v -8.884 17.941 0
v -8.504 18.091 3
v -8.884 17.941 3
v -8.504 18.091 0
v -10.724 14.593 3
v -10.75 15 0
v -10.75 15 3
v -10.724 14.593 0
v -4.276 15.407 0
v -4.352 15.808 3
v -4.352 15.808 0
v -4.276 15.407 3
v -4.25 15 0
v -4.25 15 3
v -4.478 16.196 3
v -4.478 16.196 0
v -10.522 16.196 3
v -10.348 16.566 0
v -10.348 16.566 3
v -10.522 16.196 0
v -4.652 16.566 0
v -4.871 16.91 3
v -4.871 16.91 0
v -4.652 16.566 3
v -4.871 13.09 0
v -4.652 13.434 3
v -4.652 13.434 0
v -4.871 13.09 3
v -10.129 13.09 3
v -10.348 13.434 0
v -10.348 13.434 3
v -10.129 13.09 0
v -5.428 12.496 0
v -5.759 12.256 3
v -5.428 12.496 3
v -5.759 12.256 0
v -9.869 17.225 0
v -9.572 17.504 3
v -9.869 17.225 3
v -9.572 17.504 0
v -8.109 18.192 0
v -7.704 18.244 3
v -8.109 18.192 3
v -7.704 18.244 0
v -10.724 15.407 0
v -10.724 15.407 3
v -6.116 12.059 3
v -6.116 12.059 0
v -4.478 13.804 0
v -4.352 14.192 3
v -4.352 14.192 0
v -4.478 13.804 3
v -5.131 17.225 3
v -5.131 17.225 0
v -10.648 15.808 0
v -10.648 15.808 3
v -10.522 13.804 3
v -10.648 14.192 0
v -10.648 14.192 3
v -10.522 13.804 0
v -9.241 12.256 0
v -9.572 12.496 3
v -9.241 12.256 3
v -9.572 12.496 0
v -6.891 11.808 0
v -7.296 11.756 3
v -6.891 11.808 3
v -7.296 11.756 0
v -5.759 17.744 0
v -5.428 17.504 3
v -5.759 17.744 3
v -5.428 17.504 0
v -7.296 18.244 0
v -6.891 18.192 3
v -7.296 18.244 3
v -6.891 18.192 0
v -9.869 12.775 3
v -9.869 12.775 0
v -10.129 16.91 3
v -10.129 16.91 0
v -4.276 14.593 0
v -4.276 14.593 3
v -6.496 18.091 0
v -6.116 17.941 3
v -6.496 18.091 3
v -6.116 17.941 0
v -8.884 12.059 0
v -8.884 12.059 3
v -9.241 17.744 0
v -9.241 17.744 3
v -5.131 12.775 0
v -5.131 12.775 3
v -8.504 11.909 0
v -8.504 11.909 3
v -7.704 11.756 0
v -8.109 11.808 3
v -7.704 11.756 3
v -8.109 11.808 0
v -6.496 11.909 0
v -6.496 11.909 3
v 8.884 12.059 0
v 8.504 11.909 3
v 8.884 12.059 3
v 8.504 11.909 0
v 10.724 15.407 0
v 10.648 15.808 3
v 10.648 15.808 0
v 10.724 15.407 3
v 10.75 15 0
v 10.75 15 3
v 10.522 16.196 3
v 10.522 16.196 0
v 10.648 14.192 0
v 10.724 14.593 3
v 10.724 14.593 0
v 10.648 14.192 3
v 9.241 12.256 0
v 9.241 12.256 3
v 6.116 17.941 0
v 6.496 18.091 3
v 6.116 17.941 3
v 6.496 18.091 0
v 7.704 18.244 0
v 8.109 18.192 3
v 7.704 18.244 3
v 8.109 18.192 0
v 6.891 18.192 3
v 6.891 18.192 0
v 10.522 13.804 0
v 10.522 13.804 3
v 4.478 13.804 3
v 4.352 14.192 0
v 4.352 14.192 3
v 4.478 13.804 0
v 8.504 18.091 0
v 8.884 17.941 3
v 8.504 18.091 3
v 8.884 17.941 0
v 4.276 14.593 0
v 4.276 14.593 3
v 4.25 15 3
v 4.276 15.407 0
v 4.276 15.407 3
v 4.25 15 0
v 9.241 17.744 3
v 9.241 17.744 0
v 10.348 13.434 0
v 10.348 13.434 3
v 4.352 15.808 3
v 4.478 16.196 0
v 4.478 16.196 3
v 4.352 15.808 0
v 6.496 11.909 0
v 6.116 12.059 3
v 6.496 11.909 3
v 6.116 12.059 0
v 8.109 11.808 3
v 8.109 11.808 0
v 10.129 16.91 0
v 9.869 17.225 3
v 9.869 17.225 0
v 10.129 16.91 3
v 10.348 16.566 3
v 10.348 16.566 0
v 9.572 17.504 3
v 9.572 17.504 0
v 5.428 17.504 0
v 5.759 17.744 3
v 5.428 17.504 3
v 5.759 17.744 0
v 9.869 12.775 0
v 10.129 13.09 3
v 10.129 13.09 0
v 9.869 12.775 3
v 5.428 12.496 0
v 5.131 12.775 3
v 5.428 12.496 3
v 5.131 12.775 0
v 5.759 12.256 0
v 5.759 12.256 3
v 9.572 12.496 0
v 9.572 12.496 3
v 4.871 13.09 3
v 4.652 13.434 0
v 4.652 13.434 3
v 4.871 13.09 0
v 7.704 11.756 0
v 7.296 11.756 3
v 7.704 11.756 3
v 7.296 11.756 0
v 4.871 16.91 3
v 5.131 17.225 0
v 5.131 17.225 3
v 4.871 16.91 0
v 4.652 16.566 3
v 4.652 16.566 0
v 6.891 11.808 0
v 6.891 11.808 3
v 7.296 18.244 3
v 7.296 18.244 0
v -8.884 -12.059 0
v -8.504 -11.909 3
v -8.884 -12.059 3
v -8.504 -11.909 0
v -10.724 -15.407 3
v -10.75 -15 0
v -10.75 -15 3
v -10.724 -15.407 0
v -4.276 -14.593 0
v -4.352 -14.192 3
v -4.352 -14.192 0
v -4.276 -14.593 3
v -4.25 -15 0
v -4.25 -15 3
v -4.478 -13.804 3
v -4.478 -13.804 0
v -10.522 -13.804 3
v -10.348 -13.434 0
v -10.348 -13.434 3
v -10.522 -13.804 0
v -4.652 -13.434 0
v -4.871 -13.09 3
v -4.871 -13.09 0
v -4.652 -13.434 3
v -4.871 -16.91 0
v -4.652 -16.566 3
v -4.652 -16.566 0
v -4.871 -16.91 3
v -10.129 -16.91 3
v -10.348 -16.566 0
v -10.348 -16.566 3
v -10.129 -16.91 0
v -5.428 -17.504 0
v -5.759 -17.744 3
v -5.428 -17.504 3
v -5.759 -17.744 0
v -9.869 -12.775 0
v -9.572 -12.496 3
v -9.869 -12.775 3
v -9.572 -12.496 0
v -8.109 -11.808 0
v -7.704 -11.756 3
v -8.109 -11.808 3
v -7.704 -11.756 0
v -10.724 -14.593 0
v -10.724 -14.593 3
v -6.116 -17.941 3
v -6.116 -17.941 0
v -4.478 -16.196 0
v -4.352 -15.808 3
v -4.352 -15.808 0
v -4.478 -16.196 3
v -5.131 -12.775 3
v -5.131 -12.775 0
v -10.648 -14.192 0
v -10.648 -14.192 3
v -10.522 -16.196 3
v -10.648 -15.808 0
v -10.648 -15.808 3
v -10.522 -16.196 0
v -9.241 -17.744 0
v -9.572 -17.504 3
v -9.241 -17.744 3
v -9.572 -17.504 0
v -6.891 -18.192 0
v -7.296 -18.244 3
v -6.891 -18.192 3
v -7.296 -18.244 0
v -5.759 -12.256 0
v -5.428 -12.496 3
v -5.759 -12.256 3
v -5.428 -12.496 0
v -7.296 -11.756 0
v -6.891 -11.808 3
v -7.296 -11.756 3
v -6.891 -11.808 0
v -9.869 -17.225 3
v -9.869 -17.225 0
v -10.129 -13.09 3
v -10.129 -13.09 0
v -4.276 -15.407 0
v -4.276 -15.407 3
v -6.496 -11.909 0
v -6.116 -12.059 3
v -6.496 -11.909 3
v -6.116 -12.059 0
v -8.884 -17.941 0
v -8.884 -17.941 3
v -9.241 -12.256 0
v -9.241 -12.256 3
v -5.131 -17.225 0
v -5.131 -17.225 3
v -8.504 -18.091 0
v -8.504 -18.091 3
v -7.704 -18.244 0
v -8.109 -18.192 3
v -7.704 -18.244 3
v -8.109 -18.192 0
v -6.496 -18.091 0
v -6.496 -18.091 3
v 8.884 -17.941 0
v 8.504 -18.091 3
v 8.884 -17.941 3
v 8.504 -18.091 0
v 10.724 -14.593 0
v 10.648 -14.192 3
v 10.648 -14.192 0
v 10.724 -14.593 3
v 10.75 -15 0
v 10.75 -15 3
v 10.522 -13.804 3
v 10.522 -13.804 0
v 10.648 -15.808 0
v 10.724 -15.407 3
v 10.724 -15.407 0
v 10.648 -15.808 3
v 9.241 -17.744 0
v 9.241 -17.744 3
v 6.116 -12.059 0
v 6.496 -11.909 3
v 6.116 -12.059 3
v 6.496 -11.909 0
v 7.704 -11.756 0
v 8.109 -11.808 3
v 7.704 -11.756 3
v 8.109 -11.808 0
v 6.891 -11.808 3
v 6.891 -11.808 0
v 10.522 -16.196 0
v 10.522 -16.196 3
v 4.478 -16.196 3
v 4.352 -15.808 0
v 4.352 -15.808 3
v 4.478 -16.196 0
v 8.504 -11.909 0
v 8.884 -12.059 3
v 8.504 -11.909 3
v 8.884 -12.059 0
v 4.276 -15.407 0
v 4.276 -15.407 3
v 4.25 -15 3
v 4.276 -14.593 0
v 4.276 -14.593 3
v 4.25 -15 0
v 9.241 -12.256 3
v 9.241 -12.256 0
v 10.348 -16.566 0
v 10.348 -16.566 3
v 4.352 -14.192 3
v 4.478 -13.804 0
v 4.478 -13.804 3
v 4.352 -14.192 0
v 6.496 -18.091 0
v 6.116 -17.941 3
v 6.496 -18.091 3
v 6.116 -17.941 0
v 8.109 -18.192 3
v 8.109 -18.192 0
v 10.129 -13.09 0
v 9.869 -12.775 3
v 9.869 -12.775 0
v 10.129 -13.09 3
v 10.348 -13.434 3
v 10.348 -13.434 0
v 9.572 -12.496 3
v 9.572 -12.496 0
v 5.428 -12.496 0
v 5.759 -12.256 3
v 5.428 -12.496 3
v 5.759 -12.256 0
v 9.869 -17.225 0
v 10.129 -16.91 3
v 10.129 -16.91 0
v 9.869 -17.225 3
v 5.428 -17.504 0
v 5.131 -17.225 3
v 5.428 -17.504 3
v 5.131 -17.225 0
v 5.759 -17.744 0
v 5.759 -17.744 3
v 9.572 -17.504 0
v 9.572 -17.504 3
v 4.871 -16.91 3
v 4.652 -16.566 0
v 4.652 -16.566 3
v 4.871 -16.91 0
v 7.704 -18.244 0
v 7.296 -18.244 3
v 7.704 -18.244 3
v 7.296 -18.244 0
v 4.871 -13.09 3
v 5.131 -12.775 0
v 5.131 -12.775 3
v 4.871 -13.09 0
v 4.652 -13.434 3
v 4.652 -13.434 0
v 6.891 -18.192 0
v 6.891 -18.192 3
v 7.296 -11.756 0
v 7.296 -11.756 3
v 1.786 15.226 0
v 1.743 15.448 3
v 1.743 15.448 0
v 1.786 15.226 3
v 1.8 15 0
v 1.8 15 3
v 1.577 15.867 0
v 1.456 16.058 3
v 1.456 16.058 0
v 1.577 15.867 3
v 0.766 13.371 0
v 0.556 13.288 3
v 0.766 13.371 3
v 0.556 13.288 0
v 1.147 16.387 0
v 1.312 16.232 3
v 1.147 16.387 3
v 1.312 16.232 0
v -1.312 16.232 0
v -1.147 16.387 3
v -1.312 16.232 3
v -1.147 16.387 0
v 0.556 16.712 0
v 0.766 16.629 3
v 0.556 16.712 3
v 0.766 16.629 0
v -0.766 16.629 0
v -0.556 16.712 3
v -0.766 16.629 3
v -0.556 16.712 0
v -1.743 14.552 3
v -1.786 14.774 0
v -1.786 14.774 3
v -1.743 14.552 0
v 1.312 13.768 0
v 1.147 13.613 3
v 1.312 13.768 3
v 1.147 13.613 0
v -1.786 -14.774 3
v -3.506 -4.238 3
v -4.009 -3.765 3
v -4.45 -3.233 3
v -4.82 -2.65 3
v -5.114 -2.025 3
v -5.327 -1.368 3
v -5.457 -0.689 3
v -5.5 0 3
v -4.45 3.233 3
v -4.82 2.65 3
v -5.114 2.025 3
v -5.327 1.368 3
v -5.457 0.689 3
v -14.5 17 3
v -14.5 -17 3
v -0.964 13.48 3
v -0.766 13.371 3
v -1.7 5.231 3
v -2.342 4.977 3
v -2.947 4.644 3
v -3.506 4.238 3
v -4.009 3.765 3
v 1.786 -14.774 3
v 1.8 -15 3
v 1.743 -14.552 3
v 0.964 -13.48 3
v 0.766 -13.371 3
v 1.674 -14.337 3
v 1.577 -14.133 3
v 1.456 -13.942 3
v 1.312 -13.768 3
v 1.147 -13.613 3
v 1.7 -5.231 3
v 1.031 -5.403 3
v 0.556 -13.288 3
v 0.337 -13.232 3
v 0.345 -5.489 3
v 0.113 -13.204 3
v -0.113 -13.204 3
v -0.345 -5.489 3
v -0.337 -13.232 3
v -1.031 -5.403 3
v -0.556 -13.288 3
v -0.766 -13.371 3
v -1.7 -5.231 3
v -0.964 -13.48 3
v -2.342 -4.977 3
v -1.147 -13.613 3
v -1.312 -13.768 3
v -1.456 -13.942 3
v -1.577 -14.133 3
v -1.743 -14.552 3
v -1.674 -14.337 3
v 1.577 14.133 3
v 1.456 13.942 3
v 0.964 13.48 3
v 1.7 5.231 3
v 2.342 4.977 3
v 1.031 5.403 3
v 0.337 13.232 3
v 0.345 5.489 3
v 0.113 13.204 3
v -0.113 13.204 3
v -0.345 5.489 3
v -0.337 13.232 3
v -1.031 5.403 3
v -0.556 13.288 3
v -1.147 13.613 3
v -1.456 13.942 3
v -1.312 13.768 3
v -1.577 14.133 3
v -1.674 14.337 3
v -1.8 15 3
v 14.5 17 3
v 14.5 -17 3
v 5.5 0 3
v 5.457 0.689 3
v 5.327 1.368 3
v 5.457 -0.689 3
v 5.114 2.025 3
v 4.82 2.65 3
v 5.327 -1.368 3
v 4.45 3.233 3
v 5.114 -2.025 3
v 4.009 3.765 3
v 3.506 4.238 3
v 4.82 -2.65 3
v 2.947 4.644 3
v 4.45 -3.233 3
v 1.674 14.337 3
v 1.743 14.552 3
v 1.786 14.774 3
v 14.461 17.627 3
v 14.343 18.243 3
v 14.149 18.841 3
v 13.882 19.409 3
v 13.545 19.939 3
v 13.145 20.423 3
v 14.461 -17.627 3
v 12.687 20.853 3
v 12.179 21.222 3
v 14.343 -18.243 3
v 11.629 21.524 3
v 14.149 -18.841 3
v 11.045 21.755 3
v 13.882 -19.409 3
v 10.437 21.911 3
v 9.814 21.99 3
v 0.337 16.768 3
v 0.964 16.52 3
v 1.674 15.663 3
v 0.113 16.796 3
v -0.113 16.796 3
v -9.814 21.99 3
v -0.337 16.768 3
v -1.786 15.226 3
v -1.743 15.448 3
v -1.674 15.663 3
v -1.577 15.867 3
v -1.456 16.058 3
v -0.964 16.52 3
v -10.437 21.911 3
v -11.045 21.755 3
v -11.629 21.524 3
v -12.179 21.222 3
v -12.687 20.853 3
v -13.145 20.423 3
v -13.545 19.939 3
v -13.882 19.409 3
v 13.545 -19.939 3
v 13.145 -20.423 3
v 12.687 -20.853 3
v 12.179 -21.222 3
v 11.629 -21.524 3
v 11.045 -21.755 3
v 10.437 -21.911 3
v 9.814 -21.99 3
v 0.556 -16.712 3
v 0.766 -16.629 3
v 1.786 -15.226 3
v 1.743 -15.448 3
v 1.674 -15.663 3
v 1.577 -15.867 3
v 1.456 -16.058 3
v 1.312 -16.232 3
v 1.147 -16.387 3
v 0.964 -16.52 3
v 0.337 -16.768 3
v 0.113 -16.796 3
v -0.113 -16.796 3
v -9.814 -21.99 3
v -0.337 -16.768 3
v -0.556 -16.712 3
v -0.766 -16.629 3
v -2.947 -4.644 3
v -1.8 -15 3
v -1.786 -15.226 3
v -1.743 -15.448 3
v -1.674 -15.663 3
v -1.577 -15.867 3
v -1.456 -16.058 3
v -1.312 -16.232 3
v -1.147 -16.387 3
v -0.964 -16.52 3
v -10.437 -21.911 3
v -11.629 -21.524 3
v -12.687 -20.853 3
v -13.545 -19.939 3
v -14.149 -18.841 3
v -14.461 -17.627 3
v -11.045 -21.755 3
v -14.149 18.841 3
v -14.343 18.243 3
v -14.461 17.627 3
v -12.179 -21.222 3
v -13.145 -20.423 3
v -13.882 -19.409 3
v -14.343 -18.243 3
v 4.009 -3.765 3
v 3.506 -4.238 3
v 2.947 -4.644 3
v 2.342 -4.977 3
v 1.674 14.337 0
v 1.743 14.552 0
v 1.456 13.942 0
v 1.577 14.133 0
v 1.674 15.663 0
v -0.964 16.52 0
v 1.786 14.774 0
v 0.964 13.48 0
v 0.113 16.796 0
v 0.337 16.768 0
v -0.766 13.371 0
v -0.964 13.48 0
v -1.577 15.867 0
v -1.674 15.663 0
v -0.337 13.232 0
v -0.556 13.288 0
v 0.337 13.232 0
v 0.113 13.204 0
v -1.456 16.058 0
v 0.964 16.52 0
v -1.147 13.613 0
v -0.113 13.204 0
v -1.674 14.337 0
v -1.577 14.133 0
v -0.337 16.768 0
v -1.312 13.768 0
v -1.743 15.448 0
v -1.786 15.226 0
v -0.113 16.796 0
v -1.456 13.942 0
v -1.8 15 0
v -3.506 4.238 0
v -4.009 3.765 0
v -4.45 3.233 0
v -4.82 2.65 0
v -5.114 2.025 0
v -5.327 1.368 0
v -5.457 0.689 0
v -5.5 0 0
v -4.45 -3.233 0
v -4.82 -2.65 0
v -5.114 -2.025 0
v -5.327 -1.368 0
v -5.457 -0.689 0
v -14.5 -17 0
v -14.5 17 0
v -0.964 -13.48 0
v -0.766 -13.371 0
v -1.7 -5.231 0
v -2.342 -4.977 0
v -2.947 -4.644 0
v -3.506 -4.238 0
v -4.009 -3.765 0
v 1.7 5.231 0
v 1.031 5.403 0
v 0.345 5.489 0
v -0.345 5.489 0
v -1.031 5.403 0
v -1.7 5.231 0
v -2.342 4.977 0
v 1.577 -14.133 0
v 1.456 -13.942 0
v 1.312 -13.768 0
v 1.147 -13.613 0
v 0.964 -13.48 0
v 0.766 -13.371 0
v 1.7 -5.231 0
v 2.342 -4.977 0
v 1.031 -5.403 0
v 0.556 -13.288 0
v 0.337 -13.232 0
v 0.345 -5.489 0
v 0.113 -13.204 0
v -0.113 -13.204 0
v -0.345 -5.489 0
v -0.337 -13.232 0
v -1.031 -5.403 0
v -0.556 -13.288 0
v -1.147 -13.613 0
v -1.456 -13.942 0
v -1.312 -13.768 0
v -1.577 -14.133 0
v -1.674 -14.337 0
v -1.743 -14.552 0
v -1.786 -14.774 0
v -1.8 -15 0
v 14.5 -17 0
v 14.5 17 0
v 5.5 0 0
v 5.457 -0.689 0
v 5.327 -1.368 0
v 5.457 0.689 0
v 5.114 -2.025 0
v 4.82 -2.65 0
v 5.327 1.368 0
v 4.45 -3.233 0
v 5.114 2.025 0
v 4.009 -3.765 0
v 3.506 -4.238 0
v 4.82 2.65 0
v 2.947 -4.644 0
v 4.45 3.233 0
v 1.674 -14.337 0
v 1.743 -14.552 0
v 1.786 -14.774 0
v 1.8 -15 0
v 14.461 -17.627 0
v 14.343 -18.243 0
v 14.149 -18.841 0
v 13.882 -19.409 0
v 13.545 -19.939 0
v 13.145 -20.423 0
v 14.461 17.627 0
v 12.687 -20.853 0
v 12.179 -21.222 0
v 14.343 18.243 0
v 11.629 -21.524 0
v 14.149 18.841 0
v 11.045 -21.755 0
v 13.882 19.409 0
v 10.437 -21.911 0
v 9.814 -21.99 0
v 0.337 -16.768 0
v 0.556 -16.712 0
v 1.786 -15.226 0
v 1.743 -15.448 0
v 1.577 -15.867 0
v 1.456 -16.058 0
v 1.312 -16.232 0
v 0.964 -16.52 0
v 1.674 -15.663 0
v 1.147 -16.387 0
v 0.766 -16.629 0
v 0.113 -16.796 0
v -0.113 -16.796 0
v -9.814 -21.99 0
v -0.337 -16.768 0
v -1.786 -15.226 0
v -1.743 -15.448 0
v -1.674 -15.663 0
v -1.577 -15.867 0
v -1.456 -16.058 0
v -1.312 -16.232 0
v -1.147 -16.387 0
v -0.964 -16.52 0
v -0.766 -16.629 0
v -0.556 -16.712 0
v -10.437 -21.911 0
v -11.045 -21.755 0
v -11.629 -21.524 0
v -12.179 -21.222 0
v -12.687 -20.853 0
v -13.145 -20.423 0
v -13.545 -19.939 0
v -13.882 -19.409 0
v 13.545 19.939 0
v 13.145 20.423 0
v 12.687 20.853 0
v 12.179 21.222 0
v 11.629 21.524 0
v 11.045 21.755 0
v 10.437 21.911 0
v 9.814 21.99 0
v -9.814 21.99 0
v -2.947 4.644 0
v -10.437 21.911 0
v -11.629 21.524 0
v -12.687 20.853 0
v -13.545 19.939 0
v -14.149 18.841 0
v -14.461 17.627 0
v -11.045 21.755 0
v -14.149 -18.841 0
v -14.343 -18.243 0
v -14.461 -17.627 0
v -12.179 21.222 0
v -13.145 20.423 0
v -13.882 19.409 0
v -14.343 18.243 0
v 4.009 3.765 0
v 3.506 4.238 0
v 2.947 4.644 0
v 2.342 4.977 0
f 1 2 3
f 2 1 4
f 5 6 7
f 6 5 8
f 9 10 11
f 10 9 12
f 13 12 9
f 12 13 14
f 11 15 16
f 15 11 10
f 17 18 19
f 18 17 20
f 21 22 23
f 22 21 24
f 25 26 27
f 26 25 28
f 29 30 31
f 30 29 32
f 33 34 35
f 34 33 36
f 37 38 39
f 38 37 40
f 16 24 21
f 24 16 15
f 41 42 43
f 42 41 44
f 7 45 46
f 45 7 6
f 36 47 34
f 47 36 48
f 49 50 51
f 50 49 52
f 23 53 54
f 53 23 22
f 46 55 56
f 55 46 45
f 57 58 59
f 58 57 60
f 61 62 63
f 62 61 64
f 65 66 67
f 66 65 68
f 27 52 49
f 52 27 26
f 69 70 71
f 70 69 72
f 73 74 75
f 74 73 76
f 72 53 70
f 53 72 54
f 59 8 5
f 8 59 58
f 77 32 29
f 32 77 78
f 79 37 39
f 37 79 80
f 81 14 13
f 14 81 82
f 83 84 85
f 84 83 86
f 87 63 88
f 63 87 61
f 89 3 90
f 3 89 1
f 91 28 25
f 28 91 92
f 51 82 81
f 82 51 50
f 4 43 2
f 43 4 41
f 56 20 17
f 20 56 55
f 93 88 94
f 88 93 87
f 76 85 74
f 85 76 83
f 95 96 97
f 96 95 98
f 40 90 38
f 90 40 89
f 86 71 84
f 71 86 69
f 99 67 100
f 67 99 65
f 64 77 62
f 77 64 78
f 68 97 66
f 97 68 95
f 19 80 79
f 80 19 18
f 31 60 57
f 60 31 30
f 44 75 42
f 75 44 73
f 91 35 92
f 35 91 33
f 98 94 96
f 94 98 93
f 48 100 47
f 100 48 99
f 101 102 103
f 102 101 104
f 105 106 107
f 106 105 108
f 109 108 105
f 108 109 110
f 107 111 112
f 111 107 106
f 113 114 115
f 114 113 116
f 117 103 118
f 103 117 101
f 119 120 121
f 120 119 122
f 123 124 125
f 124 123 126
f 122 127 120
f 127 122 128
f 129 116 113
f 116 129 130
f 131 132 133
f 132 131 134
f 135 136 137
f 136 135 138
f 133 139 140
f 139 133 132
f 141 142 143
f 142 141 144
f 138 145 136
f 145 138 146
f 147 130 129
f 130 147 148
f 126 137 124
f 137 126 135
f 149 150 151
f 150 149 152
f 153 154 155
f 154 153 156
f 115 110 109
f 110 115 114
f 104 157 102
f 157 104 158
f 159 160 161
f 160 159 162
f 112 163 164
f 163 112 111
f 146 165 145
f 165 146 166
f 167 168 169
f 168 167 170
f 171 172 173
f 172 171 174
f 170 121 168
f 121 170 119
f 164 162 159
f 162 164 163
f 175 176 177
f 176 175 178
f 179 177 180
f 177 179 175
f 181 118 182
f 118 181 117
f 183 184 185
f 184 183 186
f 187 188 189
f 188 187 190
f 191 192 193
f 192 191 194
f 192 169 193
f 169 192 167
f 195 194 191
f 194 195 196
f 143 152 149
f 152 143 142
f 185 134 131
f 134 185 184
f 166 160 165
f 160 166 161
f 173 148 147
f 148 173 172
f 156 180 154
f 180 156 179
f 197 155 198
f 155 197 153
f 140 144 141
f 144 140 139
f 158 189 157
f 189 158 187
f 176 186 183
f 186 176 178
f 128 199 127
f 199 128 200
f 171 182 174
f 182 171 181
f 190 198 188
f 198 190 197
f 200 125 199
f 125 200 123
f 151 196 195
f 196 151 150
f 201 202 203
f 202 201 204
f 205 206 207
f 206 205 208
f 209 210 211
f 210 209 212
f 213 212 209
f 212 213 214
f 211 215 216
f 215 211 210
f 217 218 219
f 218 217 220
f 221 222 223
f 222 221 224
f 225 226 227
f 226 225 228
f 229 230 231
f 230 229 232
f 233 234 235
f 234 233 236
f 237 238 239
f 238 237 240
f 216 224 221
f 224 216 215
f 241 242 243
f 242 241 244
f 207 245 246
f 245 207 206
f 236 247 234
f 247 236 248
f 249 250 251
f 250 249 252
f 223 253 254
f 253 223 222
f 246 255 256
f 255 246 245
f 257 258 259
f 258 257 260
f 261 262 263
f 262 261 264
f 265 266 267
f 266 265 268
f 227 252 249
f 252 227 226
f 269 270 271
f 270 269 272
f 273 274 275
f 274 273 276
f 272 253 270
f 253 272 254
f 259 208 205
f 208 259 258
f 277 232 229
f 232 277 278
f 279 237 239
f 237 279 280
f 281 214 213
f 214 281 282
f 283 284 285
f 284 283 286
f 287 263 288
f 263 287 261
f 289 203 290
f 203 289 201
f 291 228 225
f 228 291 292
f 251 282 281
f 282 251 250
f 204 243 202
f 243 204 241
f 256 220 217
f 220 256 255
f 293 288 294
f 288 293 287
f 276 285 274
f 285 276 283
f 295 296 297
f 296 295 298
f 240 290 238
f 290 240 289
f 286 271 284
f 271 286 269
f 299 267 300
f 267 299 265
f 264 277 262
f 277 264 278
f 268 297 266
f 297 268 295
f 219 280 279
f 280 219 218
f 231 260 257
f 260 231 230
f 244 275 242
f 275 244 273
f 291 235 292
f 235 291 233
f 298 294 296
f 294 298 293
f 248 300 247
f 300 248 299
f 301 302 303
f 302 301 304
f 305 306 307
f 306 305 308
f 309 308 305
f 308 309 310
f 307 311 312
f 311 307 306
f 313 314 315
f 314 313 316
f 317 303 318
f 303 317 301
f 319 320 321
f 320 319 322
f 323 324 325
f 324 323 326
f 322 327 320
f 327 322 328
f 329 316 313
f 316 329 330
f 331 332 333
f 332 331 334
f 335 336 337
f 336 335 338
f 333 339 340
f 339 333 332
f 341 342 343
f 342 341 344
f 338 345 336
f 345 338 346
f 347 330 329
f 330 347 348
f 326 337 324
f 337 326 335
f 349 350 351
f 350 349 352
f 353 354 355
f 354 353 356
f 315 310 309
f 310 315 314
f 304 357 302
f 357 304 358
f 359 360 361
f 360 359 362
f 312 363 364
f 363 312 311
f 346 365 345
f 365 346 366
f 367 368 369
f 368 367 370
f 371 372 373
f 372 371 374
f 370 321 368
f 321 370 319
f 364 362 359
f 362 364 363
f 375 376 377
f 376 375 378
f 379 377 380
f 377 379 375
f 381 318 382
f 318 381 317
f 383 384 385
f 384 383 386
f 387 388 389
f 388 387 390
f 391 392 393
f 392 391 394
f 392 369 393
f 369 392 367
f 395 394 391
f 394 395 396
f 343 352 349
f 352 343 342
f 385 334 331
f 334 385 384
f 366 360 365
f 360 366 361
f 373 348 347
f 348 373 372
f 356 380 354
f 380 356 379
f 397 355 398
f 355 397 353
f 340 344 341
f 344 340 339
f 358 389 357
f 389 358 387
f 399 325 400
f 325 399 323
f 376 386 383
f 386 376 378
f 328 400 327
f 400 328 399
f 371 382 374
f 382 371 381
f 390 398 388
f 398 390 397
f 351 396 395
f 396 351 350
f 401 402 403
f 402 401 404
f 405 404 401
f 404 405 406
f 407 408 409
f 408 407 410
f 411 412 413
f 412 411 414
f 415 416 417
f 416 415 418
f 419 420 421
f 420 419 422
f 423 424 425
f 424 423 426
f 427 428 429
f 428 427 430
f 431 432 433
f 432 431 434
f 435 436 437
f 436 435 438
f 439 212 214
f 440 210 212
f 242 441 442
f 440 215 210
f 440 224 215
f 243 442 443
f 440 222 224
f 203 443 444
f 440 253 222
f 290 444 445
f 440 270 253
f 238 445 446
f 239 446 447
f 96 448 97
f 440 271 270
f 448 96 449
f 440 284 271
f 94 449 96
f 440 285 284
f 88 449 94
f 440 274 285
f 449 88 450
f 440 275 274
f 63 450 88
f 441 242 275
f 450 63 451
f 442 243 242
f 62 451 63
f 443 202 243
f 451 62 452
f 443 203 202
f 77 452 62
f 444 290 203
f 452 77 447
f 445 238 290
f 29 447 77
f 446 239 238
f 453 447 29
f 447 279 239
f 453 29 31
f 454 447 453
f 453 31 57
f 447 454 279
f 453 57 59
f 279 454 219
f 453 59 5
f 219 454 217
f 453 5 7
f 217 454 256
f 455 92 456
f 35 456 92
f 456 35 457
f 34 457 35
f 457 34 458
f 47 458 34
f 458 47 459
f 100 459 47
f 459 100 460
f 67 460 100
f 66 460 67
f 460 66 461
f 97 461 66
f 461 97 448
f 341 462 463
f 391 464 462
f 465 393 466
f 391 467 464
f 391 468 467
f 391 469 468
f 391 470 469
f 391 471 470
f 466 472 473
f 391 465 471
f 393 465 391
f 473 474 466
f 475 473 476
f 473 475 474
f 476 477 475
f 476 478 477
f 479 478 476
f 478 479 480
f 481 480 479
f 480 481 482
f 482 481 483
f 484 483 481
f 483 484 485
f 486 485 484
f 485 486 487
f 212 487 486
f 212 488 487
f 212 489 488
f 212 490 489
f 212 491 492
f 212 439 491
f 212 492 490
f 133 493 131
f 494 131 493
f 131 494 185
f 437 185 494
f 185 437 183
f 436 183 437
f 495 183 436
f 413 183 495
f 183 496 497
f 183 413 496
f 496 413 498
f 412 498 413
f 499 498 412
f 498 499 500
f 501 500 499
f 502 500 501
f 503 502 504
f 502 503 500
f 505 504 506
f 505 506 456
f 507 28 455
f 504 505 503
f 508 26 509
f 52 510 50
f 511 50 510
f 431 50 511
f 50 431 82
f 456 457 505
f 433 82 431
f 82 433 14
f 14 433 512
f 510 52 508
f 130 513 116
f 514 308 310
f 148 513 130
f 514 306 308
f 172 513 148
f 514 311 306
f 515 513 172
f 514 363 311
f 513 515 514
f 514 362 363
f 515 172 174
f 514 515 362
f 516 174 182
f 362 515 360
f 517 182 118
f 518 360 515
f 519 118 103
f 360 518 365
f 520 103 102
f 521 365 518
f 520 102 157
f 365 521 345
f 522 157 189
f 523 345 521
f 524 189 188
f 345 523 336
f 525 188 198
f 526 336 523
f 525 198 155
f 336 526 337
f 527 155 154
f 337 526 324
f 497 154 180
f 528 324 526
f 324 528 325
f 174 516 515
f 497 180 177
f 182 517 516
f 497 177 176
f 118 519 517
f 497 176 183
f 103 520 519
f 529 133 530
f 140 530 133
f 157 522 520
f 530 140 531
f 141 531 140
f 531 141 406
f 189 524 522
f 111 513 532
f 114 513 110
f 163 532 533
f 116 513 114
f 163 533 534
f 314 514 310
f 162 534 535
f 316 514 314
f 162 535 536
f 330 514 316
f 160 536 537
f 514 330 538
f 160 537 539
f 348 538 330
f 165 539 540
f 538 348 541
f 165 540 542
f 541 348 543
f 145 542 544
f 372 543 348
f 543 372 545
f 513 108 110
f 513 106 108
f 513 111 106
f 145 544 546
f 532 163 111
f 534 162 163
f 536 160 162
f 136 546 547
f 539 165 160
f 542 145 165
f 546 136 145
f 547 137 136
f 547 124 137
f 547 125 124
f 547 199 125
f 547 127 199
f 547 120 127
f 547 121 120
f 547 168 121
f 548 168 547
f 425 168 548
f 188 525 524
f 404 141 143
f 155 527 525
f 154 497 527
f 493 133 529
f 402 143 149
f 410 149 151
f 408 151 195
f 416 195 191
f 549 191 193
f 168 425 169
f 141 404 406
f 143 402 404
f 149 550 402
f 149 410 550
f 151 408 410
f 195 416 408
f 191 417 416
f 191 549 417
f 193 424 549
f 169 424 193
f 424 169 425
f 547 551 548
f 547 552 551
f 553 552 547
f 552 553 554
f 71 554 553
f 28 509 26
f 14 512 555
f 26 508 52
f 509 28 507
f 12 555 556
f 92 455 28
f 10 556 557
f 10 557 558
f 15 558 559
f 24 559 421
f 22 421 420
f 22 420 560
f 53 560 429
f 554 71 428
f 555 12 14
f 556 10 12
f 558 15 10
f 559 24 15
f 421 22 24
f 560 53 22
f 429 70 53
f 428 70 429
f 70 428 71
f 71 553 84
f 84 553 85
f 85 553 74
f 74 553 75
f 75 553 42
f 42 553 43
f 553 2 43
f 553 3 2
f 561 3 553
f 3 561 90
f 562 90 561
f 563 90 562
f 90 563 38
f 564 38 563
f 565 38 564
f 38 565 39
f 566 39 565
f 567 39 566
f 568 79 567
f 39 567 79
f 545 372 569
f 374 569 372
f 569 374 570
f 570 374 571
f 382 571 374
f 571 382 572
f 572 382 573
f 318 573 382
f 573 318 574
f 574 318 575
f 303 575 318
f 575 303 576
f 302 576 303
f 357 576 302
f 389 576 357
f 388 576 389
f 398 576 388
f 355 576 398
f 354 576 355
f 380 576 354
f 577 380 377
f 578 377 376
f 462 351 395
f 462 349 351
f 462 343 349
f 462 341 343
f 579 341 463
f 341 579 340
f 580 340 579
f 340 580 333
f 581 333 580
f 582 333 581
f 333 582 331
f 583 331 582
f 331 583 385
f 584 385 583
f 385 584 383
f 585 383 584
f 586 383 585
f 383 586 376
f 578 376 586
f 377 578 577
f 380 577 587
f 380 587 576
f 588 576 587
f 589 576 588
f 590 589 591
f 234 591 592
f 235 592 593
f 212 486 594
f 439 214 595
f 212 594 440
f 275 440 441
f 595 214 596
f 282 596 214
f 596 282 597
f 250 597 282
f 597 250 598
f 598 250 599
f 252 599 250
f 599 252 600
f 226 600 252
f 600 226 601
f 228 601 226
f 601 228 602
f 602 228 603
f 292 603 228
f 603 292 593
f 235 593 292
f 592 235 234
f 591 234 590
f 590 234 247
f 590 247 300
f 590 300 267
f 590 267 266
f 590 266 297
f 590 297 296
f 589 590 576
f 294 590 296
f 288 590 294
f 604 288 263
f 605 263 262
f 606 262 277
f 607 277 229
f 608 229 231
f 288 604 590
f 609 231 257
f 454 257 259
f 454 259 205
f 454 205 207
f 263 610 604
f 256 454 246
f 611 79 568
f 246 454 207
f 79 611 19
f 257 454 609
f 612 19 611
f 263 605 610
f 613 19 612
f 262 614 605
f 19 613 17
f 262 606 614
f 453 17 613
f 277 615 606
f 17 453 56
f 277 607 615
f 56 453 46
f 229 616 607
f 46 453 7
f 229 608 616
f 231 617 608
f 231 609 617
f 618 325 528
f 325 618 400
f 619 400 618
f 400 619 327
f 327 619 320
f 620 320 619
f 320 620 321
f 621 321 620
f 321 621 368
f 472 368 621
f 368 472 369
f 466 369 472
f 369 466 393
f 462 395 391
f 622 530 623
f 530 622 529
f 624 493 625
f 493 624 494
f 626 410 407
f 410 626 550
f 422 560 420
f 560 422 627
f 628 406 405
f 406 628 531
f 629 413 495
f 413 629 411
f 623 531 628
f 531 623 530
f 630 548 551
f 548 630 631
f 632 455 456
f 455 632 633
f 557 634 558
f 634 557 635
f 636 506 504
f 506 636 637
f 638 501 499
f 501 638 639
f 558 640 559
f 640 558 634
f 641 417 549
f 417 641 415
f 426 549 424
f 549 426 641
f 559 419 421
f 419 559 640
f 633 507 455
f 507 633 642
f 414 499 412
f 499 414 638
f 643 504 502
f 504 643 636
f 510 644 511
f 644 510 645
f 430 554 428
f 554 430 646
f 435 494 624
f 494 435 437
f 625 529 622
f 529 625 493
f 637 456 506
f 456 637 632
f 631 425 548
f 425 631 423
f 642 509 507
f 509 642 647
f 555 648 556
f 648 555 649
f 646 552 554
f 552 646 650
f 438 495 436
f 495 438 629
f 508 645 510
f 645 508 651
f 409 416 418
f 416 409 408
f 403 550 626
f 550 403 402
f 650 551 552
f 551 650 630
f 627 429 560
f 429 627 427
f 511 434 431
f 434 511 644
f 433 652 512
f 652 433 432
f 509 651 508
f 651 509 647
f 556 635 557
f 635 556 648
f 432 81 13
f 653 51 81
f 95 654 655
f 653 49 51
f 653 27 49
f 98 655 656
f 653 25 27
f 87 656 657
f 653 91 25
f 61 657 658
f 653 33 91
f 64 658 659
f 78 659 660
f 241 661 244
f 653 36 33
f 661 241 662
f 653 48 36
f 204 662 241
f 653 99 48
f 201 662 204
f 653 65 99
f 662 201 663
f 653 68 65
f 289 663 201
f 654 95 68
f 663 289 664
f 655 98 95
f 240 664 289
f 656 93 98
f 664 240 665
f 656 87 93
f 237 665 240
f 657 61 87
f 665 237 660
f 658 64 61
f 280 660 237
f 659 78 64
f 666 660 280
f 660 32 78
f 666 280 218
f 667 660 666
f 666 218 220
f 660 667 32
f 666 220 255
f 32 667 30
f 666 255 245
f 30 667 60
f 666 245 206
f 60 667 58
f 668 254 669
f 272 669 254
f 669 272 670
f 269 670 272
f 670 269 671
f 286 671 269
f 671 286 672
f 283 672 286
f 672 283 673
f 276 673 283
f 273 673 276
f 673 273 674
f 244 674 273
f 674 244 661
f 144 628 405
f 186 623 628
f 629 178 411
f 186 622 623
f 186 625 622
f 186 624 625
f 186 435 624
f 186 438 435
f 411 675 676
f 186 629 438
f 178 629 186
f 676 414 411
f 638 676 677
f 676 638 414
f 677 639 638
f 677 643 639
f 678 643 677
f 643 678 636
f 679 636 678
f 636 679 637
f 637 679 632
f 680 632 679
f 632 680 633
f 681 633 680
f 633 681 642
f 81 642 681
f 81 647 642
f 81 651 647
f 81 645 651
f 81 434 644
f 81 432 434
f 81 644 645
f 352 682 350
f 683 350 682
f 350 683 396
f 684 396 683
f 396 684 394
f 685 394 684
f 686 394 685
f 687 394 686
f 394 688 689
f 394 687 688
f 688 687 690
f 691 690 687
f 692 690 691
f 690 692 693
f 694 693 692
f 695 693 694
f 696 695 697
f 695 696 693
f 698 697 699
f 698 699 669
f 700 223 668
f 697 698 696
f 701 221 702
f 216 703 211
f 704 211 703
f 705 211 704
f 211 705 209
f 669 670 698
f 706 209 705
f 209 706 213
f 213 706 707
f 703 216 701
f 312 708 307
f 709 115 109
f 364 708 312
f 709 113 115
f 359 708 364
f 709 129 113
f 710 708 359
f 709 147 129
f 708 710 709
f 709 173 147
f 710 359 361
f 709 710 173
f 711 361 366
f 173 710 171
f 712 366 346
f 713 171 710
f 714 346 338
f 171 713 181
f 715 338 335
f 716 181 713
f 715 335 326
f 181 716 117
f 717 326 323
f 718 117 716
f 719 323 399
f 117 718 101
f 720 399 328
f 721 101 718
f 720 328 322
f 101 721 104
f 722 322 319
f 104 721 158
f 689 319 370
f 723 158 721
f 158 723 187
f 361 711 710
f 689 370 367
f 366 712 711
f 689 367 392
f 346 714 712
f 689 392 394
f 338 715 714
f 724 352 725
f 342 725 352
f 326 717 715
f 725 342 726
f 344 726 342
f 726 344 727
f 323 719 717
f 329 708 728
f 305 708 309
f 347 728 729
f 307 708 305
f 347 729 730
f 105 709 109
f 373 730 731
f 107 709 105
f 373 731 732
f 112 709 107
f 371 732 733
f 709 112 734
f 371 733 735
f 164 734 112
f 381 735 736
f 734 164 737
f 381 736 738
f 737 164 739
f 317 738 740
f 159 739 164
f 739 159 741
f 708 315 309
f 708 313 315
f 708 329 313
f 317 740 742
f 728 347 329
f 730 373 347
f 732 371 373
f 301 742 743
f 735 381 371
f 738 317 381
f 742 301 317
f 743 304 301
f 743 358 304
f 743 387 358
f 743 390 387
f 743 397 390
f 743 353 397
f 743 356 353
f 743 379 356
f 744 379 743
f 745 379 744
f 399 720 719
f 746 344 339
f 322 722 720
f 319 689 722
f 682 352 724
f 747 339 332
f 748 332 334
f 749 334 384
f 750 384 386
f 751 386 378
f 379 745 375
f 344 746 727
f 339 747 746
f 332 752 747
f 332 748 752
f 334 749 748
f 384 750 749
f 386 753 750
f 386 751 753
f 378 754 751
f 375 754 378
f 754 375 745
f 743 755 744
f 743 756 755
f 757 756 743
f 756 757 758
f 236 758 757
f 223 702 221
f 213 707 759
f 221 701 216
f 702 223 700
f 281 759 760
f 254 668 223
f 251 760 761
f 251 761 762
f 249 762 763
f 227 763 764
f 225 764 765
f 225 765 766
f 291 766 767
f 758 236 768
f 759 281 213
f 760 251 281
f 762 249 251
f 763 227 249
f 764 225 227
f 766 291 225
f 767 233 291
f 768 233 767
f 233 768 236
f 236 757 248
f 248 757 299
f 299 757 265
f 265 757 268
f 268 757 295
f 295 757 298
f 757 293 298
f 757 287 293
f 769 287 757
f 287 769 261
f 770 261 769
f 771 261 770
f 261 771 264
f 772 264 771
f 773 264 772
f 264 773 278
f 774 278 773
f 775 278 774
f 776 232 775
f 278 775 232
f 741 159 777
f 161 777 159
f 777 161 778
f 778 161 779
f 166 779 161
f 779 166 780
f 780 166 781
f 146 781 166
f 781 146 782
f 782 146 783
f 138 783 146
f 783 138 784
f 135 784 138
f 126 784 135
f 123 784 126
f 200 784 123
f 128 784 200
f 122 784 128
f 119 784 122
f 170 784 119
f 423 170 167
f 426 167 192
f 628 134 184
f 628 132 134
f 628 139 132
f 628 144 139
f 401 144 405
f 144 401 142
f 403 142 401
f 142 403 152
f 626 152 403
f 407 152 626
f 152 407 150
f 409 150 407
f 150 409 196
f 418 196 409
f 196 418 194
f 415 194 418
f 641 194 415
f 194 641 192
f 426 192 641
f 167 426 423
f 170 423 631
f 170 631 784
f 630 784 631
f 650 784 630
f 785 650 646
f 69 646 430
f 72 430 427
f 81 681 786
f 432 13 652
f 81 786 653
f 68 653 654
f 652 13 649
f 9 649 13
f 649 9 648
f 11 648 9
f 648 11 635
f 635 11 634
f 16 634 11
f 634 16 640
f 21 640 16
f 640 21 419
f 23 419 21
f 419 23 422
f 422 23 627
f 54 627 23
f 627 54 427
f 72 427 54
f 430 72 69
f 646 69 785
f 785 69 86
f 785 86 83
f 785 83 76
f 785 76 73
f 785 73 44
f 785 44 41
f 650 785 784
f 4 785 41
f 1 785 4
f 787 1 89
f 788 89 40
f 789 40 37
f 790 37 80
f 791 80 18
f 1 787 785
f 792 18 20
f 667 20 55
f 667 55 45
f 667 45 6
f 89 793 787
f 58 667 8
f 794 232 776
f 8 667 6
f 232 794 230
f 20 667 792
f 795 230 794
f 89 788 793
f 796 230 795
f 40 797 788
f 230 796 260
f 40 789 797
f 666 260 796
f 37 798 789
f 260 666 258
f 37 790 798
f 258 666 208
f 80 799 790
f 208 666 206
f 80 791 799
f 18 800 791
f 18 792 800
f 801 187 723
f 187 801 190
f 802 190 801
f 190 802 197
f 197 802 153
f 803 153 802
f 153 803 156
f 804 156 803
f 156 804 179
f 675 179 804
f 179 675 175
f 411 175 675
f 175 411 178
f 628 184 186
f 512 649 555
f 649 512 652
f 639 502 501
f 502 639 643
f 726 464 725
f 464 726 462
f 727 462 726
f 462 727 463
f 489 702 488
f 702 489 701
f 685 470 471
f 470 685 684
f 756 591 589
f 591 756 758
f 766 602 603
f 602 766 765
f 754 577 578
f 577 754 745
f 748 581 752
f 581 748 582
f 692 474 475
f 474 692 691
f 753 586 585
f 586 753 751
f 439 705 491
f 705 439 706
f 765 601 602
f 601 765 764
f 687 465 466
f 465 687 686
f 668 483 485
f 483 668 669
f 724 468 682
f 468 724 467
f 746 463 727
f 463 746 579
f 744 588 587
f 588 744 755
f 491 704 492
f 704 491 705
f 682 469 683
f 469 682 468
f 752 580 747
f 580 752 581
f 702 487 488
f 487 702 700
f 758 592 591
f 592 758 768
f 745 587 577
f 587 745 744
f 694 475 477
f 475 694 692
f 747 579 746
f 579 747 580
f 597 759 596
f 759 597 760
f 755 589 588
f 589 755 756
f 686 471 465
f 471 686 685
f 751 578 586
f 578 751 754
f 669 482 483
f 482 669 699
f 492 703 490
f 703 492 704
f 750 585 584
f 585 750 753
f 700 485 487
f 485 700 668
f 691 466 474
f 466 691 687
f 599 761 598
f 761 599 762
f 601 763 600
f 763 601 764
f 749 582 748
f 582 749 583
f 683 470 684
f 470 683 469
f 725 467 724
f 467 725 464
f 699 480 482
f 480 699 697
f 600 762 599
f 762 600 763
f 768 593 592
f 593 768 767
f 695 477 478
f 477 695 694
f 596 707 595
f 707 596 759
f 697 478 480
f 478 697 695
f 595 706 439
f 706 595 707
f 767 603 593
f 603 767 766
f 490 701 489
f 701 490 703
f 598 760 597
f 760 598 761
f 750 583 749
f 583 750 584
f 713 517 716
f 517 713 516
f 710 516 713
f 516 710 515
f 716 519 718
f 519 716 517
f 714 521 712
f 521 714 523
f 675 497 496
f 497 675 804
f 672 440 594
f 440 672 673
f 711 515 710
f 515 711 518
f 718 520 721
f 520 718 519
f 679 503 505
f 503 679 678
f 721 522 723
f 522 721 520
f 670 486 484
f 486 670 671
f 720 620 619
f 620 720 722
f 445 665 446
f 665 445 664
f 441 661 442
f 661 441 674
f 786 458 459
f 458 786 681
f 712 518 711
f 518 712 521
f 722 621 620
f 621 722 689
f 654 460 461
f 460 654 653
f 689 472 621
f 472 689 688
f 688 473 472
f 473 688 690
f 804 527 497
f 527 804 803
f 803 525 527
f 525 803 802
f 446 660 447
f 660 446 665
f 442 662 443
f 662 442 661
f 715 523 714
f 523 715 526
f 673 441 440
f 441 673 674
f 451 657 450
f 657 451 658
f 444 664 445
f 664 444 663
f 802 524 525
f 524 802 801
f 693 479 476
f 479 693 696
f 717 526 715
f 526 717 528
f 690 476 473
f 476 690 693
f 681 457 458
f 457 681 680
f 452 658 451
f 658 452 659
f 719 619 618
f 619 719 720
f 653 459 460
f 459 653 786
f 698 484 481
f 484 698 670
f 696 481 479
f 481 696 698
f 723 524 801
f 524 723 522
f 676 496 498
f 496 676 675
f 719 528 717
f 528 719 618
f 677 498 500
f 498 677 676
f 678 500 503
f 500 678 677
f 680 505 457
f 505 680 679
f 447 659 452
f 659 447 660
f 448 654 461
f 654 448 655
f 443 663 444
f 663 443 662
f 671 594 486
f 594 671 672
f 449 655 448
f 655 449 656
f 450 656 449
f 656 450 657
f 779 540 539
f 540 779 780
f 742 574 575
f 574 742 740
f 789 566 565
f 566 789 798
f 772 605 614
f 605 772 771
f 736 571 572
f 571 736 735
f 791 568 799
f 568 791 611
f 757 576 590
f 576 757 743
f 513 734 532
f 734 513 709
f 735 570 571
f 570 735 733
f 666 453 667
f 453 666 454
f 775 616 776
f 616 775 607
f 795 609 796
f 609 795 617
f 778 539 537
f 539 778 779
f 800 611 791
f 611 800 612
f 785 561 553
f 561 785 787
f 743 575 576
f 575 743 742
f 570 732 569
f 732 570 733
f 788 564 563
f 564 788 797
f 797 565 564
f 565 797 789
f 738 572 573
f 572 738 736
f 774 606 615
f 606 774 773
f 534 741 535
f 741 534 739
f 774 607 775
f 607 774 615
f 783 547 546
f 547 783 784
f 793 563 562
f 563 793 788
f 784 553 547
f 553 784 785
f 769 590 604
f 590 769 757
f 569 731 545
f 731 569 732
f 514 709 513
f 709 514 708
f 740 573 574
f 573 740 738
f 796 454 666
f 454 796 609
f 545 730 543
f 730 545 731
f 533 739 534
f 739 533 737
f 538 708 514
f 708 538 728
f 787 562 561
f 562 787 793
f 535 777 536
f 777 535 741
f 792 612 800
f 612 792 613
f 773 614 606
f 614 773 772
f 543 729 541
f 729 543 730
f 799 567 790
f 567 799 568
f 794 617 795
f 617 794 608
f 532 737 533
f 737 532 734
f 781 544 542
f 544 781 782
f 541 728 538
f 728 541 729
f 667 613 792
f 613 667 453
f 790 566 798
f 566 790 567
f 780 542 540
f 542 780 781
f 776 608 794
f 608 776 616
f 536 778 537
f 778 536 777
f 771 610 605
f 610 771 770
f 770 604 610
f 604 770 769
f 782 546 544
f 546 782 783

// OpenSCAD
$fn = 50;


difference() {
	union() {
		hull() {
			translate(v = [-9.5000000000, 17.0000000000, 0]) {
				cylinder(h = 3, r = 5);
			}
			translate(v = [9.5000000000, 17.0000000000, 0]) {
				cylinder(h = 3, r = 5);
			}
			translate(v = [-9.5000000000, -17.0000000000, 0]) {
				cylinder(h = 3, r = 5);
			}
			translate(v = [9.5000000000, -17.0000000000, 0]) {
				cylinder(h = 3, r = 5);
			}
		}
	}
	union() {
		#translate(v = [-7.5000000000, 15.0000000000, 0]) {
			cylinder(h = 3, r = 3.2500000000);
		}
		#translate(v = [7.5000000000, 15.0000000000, 0]) {
			cylinder(h = 3, r = 3.2500000000);
		}
		#translate(v = [-7.5000000000, -15.0000000000, 0]) {
			cylinder(h = 3, r = 3.2500000000);
		}
		#translate(v = [7.5000000000, -15.0000000000, 0]) {
			cylinder(h = 3, r = 3.2500000000);
		}
		#translate(v = [-7.5000000000, -15.0000000000, -100.0000000000]) {
			cylinder(h = 200, r = 3.2500000000);
		}
		#translate(v = [-7.5000000000, 15.0000000000, -100.0000000000]) {
			cylinder(h = 200, r = 3.2500000000);
		}
		#translate(v = [7.5000000000, -15.0000000000, -100.0000000000]) {
			cylinder(h = 200, r = 3.2500000000);
		}
		#translate(v = [7.5000000000, 15.0000000000, -100.0000000000]) {
			cylinder(h = 200, r = 3.2500000000);
		}
		#translate(v = [-7.5000000000, 15.0000000000, 0]) {
			cylinder(h = 3, r = 1.8000000000);
		}
		#translate(v = [0.0000000000, 15.0000000000, 0]) {
			cylinder(h = 3, r = 1.8000000000);
		}
		#translate(v = [7.5000000000, 15.0000000000, 0]) {
			cylinder(h = 3, r = 1.8000000000);
		}
		#translate(v = [-7.5000000000, -15.0000000000, 0]) {
			cylinder(h = 3, r = 1.8000000000);
		}
		#translate(v = [0.0000000000, -15.0000000000, 0]) {
			cylinder(h = 3, r = 1.8000000000);
		}
		#translate(v = [7.5000000000, -15.0000000000, 0]) {
			cylinder(h = 3, r = 1.8000000000);
		}
		#translate(v = [-7.5000000000, 15.0000000000, 0]) {
			cylinder(h = 3, r = 1.8000000000);
		}
		#translate(v = [0.0000000000, 15.0000000000, 0]) {
			cylinder(h = 3, r = 1.8000000000);
		}
		#translate(v = [7.5000000000, 15.0000000000, 0]) {
			cylinder(h = 3, r = 1.8000000000);
		}
		#translate(v = [-7.5000000000, -15.0000000000, 0]) {
			cylinder(h = 3, r = 1.8000000000);
		}
		#translate(v = [0.0000000000, -15.0000000000, 0]) {
			cylinder(h = 3, r = 1.8000000000);
		}
		#translate(v = [7.5000000000, -15.0000000000, 0]) {
			cylinder(h = 3, r = 1.8000000000);
		}
		#translate(v = [-7.5000000000, 15.0000000000, 0]) {
			cylinder(h = 3, r = 1.8000000000);
		}
		#translate(v = [0.0000000000, 15.0000000000, 0]) {
			cylinder(h = 3, r = 1.8000000000);
		}
		#translate(v = [7.5000000000, 15.0000000000, 0]) {
			cylinder(h = 3, r = 1.8000000000);
		}
		#translate(v = [-7.5000000000, -15.0000000000, 0]) {
			cylinder(h = 3, r = 1.8000000000);
		}
		#translate(v = [0.0000000000, -15.0000000000, 0]) {
			cylinder(h = 3, r = 1.8000000000);
		}
		#translate(v = [7.5000000000, -15.0000000000, 0]) {
			cylinder(h = 3, r = 1.8000000000);
		}
		#cylinder(h = 3, r = 5.5000000000);
	}
}
